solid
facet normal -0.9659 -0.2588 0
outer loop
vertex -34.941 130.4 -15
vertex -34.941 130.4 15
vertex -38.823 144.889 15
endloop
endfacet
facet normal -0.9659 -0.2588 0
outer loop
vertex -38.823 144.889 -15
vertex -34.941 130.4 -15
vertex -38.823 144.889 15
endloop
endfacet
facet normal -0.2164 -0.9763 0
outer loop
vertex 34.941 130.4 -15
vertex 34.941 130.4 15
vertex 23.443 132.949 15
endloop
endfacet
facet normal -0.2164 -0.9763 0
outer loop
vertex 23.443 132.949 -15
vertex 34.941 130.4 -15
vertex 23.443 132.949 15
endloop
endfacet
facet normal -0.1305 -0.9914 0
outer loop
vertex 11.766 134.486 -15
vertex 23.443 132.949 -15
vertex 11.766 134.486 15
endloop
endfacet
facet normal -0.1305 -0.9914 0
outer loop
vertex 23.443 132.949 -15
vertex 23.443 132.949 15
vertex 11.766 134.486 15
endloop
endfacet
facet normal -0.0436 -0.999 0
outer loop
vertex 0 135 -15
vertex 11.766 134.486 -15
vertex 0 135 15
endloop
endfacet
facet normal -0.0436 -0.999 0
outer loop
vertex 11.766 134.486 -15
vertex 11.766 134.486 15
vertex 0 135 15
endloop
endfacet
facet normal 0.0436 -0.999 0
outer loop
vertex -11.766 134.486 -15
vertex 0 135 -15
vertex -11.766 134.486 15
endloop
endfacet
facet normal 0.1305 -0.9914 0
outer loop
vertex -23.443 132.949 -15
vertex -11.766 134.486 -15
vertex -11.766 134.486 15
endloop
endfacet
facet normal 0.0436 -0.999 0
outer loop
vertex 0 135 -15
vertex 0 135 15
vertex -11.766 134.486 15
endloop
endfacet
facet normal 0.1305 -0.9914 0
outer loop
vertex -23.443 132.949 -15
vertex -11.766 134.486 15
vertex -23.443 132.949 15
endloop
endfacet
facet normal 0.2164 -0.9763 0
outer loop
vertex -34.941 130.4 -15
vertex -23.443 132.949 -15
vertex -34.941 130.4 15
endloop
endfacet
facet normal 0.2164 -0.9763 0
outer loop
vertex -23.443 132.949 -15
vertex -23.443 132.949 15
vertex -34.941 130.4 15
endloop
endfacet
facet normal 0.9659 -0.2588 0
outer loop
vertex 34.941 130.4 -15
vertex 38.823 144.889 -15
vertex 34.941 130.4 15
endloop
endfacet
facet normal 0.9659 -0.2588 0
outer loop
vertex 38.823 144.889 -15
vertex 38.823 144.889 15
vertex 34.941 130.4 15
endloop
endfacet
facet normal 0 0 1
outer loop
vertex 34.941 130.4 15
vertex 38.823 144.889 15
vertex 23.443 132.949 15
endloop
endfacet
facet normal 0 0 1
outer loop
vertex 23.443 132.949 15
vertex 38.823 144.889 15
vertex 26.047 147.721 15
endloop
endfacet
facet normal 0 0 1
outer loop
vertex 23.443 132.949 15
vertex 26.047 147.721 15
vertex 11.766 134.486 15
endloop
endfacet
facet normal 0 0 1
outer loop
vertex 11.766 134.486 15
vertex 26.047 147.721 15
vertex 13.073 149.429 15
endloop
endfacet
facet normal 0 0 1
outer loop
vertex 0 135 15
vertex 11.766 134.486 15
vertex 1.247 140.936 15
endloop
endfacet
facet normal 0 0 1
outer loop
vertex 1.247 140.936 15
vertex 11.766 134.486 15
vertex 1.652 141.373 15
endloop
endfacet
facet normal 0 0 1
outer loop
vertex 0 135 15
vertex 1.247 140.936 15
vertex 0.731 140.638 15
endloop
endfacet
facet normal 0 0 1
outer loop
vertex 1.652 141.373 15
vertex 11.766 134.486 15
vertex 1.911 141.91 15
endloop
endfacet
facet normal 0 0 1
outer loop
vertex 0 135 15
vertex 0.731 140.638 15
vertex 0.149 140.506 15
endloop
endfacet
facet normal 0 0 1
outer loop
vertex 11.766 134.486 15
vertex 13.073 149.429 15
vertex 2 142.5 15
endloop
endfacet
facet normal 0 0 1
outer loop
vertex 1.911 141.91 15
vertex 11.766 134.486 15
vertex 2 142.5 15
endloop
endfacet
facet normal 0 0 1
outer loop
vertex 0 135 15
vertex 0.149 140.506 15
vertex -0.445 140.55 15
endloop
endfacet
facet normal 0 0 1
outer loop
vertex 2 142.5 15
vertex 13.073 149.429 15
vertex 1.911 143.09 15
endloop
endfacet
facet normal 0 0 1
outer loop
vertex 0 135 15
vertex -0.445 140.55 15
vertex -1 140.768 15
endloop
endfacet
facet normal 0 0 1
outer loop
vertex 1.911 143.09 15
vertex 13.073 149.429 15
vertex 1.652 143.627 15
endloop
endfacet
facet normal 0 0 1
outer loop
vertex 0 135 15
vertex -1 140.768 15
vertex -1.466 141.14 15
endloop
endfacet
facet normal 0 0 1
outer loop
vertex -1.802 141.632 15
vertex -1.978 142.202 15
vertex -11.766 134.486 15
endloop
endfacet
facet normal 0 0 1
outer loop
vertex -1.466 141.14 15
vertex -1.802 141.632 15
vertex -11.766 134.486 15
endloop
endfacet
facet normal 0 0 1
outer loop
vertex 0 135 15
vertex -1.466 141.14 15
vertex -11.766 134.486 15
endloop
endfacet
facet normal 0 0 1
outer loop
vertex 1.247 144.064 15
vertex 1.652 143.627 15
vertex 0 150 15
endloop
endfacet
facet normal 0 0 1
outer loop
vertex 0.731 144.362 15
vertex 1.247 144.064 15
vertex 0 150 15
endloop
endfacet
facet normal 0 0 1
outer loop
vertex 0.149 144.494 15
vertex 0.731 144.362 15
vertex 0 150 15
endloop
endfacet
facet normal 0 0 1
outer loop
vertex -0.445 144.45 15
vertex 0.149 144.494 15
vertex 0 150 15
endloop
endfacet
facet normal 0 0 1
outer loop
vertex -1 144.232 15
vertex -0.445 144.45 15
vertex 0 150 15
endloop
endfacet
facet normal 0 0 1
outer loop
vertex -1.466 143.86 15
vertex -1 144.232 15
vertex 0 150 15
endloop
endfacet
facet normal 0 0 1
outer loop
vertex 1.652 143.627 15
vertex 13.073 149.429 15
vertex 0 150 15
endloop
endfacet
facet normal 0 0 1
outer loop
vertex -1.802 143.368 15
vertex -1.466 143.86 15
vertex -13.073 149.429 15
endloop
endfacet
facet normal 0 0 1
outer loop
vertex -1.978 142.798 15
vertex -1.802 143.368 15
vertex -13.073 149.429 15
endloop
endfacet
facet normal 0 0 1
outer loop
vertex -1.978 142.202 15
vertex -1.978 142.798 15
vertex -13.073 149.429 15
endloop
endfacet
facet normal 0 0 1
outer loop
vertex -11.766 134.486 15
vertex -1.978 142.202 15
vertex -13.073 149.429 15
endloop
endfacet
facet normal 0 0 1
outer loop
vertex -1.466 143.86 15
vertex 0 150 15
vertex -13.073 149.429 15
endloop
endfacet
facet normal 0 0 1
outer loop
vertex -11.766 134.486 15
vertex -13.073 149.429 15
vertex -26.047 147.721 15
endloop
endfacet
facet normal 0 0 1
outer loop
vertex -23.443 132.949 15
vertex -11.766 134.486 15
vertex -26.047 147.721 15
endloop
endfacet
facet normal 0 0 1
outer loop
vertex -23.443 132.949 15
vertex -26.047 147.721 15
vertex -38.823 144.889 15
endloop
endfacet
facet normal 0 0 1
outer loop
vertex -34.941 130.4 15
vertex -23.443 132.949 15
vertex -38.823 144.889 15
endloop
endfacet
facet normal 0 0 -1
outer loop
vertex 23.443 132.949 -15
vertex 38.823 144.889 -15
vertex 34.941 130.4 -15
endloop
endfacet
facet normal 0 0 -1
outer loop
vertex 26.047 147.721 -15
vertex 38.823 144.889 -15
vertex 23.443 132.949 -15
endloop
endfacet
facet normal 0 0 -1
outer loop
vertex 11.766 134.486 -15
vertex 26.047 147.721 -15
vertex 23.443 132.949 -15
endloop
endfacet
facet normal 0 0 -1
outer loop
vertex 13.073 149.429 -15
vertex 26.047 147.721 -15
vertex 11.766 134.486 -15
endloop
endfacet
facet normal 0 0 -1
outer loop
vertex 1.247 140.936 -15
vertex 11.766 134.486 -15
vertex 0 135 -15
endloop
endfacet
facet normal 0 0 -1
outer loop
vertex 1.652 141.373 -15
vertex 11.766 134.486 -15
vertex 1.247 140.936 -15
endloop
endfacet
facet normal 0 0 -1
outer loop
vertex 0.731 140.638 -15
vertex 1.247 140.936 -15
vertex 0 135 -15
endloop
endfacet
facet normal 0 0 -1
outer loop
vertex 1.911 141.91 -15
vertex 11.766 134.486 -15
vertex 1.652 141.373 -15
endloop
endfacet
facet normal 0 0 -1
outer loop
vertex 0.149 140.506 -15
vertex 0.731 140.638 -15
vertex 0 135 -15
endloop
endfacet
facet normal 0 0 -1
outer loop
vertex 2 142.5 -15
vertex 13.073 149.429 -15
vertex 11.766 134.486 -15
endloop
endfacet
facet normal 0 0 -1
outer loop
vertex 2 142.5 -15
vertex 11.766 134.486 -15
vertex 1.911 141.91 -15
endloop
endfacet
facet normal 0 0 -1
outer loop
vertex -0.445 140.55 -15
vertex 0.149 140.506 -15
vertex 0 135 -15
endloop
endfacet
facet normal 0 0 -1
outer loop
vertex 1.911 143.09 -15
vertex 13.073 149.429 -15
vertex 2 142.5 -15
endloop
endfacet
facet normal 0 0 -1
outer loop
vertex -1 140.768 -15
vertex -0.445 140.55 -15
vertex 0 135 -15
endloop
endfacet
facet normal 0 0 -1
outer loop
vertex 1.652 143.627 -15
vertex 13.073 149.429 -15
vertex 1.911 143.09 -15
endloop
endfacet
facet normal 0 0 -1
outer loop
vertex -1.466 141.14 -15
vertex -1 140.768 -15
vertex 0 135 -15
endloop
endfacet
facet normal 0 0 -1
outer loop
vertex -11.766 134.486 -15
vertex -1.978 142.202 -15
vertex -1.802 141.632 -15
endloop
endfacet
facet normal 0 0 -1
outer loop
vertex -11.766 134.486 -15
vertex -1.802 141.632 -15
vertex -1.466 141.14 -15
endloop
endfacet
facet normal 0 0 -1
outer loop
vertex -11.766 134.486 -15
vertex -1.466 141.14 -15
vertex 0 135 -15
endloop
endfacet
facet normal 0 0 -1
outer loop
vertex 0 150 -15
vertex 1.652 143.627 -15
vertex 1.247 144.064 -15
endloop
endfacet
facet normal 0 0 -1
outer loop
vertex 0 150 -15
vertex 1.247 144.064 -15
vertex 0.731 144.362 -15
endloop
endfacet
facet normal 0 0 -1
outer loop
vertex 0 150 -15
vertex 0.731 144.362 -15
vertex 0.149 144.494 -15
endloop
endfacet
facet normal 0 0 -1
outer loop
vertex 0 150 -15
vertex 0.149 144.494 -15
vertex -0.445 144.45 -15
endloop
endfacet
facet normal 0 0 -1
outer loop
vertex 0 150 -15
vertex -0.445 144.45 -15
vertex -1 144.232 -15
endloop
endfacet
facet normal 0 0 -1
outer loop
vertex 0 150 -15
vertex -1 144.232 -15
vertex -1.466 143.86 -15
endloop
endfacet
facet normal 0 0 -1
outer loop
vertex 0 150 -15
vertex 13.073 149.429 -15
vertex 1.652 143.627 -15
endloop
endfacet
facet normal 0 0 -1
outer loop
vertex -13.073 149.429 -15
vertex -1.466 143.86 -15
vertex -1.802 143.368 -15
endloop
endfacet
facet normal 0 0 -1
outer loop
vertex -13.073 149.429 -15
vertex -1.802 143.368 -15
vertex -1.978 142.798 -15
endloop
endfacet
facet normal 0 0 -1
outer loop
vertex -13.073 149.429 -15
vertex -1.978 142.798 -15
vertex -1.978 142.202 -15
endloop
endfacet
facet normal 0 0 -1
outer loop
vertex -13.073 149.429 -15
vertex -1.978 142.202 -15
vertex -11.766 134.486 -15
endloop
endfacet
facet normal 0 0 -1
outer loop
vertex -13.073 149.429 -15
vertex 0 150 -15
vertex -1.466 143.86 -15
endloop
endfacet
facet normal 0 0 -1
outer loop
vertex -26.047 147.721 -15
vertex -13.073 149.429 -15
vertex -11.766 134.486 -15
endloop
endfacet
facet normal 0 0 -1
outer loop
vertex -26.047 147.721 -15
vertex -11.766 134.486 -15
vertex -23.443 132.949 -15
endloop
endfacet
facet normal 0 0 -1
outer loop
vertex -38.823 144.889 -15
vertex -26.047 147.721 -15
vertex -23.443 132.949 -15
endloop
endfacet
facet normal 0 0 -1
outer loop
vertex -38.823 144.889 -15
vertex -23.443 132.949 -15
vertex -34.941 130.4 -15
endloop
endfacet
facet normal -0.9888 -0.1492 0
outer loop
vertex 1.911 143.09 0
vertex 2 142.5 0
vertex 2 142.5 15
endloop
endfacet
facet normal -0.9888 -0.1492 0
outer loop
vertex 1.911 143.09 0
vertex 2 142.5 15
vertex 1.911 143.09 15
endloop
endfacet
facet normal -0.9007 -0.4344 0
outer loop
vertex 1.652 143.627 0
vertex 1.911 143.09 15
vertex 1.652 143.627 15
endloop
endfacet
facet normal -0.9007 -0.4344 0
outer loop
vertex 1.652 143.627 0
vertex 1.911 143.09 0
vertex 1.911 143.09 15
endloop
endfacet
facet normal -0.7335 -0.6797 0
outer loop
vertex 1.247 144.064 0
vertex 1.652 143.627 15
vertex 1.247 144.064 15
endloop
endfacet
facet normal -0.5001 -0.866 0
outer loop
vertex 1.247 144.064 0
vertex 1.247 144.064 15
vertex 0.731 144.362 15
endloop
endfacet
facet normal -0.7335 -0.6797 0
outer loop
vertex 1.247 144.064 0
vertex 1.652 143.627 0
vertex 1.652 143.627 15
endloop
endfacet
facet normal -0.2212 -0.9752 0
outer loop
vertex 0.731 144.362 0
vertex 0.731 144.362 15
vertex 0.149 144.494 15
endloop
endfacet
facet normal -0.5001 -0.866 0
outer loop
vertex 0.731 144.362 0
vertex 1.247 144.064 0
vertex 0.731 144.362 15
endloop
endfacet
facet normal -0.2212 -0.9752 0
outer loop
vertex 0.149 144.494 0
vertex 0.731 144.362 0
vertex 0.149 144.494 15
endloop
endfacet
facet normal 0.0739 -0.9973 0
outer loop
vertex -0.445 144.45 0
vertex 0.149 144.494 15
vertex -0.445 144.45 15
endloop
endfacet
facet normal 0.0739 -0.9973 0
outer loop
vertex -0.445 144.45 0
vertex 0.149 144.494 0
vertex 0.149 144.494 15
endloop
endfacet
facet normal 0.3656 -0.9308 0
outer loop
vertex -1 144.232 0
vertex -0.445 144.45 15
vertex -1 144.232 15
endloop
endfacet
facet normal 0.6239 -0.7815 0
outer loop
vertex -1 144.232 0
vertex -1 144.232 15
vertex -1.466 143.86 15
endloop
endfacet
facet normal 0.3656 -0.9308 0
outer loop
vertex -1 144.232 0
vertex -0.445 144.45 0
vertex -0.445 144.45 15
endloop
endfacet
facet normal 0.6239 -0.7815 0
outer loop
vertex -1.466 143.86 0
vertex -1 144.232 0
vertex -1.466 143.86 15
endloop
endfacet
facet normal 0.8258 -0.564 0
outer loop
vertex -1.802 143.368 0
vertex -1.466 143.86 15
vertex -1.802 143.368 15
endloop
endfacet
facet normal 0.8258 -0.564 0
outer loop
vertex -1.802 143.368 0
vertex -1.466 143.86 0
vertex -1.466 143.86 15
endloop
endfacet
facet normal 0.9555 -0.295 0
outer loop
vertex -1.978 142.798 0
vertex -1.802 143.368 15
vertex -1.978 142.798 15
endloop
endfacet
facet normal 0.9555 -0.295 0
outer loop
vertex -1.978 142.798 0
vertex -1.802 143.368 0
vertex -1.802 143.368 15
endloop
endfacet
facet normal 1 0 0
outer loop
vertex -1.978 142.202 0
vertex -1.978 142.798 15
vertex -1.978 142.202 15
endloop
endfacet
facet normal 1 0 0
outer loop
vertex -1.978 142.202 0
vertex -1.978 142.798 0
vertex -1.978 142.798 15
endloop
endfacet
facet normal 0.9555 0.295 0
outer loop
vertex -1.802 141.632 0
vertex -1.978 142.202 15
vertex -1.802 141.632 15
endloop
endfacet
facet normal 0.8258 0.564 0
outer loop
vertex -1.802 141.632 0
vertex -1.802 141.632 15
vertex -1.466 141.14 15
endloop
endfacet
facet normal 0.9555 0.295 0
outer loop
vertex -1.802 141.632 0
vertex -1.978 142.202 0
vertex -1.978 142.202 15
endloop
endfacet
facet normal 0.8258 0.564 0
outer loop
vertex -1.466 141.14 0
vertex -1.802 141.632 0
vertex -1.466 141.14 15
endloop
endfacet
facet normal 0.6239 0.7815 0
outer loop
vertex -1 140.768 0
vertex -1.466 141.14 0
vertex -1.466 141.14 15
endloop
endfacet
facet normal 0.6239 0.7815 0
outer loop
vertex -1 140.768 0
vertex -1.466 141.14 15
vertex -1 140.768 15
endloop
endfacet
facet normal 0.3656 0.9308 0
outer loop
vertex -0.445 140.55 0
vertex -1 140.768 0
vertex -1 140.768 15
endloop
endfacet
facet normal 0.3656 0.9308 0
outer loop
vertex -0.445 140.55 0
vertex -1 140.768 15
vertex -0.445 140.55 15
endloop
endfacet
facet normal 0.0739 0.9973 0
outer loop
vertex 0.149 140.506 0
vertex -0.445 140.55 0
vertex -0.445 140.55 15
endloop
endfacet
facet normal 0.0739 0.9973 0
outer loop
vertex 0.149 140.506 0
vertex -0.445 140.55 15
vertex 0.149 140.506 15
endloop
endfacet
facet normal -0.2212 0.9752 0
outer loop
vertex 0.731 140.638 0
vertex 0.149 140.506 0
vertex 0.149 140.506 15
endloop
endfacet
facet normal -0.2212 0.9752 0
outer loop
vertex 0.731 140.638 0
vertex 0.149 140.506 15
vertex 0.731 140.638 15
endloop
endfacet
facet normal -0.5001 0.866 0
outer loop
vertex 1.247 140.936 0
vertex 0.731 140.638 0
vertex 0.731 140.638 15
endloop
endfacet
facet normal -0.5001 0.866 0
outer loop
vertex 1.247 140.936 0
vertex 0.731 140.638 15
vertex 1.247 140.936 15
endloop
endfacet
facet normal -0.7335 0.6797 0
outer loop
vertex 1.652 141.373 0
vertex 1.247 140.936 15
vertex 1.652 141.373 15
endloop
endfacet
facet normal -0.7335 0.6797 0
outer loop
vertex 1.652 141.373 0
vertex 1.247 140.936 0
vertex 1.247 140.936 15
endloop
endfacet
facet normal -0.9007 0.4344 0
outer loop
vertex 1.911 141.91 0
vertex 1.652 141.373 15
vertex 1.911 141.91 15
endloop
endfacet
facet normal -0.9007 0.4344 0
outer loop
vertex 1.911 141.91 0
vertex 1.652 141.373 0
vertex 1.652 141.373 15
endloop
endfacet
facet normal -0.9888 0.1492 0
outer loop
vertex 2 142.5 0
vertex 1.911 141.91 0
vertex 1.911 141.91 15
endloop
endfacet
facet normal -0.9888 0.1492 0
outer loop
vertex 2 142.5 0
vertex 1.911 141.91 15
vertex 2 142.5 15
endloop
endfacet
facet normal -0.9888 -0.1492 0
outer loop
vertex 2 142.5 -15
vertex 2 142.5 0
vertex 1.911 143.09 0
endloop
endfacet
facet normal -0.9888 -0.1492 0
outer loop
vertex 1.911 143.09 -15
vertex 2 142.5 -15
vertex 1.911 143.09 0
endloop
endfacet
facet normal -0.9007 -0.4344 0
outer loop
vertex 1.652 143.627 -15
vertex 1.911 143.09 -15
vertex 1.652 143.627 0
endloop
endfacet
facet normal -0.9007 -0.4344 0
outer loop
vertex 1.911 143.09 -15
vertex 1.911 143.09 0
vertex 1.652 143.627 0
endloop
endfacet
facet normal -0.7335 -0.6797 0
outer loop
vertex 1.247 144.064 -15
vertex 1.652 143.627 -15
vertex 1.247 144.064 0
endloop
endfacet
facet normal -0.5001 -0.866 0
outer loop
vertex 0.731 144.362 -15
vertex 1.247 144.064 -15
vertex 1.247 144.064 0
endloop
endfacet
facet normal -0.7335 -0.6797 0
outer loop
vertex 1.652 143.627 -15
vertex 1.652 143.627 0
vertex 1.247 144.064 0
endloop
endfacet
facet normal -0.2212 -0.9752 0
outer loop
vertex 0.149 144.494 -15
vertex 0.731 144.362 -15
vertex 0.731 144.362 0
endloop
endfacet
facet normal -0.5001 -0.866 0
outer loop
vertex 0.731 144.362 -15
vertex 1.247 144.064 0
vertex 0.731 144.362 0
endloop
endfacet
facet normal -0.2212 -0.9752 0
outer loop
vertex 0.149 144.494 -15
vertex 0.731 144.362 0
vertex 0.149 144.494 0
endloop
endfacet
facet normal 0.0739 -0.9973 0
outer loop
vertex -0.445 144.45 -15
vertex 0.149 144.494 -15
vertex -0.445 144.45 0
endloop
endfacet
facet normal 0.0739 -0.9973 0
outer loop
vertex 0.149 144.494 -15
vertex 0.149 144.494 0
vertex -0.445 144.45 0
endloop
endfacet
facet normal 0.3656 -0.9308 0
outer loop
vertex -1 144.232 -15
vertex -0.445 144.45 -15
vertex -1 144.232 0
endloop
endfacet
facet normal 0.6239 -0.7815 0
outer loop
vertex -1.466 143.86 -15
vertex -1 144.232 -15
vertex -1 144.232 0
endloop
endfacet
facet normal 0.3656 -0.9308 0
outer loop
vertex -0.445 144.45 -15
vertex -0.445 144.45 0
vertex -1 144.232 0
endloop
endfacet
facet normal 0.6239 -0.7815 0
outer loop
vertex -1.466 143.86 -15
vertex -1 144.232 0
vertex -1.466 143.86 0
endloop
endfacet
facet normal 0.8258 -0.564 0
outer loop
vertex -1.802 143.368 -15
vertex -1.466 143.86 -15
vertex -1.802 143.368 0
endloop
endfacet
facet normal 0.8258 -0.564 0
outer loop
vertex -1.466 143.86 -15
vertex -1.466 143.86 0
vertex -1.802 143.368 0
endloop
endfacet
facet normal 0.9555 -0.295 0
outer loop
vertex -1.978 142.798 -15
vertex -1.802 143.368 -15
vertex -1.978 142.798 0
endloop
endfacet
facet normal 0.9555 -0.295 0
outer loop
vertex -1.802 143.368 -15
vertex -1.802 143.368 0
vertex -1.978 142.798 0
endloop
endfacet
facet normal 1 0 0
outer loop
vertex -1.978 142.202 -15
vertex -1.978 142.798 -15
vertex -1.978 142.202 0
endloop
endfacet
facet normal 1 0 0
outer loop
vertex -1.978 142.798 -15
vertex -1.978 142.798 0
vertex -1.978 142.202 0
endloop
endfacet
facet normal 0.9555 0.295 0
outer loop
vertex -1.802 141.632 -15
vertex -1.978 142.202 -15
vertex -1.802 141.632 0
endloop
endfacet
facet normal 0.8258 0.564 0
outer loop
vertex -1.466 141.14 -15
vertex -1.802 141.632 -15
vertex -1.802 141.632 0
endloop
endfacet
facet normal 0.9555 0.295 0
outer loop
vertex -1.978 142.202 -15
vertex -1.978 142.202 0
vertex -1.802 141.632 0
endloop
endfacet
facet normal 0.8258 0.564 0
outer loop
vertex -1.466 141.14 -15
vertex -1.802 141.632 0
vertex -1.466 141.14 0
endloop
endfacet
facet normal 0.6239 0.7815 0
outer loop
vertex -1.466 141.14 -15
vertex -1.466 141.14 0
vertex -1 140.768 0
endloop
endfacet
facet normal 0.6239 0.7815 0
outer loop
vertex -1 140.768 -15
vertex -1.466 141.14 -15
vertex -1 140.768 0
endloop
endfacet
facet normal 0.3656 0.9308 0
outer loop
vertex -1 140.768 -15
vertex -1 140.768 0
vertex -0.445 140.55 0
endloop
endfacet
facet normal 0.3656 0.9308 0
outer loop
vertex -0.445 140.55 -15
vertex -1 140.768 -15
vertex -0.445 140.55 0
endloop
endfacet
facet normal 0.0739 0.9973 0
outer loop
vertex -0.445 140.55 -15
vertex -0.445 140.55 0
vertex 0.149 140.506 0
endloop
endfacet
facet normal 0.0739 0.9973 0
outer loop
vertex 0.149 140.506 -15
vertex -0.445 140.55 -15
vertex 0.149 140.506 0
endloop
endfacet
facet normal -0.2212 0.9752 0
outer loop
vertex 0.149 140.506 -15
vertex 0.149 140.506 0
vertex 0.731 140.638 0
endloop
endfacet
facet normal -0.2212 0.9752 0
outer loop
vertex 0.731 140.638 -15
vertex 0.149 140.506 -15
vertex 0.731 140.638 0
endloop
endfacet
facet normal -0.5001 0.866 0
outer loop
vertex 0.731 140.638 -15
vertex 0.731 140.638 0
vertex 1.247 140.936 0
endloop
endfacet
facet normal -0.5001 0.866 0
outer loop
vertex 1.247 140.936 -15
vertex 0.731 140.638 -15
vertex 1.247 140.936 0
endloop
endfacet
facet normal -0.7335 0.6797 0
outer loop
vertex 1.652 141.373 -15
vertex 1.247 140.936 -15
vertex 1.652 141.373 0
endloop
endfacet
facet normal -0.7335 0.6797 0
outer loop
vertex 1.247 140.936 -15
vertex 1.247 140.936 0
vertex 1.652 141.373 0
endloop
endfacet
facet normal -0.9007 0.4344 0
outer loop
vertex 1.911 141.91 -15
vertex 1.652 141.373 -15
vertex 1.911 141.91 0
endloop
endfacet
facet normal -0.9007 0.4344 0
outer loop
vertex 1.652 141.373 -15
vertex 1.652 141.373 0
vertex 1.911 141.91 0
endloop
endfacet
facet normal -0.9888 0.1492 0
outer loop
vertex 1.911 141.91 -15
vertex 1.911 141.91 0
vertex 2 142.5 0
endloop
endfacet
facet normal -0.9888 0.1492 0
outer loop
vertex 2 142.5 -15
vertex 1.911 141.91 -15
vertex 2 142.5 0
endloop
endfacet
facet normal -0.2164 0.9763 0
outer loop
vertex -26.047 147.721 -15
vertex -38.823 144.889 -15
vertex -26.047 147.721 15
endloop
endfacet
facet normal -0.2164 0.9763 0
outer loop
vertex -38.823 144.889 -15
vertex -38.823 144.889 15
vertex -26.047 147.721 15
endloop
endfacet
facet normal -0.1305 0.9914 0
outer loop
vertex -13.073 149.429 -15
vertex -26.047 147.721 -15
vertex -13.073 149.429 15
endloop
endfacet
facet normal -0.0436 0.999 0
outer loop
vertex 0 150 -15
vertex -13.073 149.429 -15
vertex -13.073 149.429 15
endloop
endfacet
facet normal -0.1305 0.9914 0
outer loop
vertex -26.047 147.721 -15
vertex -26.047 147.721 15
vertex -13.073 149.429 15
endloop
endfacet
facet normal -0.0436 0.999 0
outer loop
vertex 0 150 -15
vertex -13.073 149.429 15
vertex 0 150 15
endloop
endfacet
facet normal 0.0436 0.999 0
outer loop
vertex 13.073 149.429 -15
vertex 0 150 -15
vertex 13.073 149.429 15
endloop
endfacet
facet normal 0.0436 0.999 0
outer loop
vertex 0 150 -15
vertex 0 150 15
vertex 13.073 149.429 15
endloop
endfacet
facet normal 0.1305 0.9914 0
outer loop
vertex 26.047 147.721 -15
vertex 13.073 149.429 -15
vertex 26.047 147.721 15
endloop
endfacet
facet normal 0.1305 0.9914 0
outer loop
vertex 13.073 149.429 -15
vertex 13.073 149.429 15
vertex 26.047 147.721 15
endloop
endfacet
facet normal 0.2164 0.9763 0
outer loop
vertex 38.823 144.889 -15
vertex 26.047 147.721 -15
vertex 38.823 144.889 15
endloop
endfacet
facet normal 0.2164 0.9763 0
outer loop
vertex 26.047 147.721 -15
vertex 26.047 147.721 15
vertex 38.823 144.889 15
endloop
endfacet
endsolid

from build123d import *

# Parameters (mm, degrees)
BOSS_EXTRUDE1_DEPTH      = 15
BOSS_EXTRUDE1_DEPTH_BACK = 15
SKETCH1_R                = 2


with BuildPart() as part:
    # Sketch1 → Boss-Extrude1 (new, two sides: drawn at the far end of the back side and taken through both)
    with BuildSketch(Plane.XY.offset(-BOSS_EXTRUDE1_DEPTH_BACK)):
        with BuildLine():
            Line((-34.940571089, 130.399986549), (-38.822856765, 144.888873943))
            ThreePointArc((-38.822856765, 144.888873943), (0, 150), (38.822856765, 144.888873943))
            Line((38.822856765, 144.888873943), (34.940571089, 130.399986549))
            ThreePointArc((34.940571089, 130.399986549), (0, 135), (-34.940571089, 130.399986549))
        make_face()
        with Locations((0, 142.5)):
            Circle(SKETCH1_R, mode=Mode.SUBTRACT)
    extrude(amount=BOSS_EXTRUDE1_DEPTH + BOSS_EXTRUDE1_DEPTH_BACK)


solid = part.part
